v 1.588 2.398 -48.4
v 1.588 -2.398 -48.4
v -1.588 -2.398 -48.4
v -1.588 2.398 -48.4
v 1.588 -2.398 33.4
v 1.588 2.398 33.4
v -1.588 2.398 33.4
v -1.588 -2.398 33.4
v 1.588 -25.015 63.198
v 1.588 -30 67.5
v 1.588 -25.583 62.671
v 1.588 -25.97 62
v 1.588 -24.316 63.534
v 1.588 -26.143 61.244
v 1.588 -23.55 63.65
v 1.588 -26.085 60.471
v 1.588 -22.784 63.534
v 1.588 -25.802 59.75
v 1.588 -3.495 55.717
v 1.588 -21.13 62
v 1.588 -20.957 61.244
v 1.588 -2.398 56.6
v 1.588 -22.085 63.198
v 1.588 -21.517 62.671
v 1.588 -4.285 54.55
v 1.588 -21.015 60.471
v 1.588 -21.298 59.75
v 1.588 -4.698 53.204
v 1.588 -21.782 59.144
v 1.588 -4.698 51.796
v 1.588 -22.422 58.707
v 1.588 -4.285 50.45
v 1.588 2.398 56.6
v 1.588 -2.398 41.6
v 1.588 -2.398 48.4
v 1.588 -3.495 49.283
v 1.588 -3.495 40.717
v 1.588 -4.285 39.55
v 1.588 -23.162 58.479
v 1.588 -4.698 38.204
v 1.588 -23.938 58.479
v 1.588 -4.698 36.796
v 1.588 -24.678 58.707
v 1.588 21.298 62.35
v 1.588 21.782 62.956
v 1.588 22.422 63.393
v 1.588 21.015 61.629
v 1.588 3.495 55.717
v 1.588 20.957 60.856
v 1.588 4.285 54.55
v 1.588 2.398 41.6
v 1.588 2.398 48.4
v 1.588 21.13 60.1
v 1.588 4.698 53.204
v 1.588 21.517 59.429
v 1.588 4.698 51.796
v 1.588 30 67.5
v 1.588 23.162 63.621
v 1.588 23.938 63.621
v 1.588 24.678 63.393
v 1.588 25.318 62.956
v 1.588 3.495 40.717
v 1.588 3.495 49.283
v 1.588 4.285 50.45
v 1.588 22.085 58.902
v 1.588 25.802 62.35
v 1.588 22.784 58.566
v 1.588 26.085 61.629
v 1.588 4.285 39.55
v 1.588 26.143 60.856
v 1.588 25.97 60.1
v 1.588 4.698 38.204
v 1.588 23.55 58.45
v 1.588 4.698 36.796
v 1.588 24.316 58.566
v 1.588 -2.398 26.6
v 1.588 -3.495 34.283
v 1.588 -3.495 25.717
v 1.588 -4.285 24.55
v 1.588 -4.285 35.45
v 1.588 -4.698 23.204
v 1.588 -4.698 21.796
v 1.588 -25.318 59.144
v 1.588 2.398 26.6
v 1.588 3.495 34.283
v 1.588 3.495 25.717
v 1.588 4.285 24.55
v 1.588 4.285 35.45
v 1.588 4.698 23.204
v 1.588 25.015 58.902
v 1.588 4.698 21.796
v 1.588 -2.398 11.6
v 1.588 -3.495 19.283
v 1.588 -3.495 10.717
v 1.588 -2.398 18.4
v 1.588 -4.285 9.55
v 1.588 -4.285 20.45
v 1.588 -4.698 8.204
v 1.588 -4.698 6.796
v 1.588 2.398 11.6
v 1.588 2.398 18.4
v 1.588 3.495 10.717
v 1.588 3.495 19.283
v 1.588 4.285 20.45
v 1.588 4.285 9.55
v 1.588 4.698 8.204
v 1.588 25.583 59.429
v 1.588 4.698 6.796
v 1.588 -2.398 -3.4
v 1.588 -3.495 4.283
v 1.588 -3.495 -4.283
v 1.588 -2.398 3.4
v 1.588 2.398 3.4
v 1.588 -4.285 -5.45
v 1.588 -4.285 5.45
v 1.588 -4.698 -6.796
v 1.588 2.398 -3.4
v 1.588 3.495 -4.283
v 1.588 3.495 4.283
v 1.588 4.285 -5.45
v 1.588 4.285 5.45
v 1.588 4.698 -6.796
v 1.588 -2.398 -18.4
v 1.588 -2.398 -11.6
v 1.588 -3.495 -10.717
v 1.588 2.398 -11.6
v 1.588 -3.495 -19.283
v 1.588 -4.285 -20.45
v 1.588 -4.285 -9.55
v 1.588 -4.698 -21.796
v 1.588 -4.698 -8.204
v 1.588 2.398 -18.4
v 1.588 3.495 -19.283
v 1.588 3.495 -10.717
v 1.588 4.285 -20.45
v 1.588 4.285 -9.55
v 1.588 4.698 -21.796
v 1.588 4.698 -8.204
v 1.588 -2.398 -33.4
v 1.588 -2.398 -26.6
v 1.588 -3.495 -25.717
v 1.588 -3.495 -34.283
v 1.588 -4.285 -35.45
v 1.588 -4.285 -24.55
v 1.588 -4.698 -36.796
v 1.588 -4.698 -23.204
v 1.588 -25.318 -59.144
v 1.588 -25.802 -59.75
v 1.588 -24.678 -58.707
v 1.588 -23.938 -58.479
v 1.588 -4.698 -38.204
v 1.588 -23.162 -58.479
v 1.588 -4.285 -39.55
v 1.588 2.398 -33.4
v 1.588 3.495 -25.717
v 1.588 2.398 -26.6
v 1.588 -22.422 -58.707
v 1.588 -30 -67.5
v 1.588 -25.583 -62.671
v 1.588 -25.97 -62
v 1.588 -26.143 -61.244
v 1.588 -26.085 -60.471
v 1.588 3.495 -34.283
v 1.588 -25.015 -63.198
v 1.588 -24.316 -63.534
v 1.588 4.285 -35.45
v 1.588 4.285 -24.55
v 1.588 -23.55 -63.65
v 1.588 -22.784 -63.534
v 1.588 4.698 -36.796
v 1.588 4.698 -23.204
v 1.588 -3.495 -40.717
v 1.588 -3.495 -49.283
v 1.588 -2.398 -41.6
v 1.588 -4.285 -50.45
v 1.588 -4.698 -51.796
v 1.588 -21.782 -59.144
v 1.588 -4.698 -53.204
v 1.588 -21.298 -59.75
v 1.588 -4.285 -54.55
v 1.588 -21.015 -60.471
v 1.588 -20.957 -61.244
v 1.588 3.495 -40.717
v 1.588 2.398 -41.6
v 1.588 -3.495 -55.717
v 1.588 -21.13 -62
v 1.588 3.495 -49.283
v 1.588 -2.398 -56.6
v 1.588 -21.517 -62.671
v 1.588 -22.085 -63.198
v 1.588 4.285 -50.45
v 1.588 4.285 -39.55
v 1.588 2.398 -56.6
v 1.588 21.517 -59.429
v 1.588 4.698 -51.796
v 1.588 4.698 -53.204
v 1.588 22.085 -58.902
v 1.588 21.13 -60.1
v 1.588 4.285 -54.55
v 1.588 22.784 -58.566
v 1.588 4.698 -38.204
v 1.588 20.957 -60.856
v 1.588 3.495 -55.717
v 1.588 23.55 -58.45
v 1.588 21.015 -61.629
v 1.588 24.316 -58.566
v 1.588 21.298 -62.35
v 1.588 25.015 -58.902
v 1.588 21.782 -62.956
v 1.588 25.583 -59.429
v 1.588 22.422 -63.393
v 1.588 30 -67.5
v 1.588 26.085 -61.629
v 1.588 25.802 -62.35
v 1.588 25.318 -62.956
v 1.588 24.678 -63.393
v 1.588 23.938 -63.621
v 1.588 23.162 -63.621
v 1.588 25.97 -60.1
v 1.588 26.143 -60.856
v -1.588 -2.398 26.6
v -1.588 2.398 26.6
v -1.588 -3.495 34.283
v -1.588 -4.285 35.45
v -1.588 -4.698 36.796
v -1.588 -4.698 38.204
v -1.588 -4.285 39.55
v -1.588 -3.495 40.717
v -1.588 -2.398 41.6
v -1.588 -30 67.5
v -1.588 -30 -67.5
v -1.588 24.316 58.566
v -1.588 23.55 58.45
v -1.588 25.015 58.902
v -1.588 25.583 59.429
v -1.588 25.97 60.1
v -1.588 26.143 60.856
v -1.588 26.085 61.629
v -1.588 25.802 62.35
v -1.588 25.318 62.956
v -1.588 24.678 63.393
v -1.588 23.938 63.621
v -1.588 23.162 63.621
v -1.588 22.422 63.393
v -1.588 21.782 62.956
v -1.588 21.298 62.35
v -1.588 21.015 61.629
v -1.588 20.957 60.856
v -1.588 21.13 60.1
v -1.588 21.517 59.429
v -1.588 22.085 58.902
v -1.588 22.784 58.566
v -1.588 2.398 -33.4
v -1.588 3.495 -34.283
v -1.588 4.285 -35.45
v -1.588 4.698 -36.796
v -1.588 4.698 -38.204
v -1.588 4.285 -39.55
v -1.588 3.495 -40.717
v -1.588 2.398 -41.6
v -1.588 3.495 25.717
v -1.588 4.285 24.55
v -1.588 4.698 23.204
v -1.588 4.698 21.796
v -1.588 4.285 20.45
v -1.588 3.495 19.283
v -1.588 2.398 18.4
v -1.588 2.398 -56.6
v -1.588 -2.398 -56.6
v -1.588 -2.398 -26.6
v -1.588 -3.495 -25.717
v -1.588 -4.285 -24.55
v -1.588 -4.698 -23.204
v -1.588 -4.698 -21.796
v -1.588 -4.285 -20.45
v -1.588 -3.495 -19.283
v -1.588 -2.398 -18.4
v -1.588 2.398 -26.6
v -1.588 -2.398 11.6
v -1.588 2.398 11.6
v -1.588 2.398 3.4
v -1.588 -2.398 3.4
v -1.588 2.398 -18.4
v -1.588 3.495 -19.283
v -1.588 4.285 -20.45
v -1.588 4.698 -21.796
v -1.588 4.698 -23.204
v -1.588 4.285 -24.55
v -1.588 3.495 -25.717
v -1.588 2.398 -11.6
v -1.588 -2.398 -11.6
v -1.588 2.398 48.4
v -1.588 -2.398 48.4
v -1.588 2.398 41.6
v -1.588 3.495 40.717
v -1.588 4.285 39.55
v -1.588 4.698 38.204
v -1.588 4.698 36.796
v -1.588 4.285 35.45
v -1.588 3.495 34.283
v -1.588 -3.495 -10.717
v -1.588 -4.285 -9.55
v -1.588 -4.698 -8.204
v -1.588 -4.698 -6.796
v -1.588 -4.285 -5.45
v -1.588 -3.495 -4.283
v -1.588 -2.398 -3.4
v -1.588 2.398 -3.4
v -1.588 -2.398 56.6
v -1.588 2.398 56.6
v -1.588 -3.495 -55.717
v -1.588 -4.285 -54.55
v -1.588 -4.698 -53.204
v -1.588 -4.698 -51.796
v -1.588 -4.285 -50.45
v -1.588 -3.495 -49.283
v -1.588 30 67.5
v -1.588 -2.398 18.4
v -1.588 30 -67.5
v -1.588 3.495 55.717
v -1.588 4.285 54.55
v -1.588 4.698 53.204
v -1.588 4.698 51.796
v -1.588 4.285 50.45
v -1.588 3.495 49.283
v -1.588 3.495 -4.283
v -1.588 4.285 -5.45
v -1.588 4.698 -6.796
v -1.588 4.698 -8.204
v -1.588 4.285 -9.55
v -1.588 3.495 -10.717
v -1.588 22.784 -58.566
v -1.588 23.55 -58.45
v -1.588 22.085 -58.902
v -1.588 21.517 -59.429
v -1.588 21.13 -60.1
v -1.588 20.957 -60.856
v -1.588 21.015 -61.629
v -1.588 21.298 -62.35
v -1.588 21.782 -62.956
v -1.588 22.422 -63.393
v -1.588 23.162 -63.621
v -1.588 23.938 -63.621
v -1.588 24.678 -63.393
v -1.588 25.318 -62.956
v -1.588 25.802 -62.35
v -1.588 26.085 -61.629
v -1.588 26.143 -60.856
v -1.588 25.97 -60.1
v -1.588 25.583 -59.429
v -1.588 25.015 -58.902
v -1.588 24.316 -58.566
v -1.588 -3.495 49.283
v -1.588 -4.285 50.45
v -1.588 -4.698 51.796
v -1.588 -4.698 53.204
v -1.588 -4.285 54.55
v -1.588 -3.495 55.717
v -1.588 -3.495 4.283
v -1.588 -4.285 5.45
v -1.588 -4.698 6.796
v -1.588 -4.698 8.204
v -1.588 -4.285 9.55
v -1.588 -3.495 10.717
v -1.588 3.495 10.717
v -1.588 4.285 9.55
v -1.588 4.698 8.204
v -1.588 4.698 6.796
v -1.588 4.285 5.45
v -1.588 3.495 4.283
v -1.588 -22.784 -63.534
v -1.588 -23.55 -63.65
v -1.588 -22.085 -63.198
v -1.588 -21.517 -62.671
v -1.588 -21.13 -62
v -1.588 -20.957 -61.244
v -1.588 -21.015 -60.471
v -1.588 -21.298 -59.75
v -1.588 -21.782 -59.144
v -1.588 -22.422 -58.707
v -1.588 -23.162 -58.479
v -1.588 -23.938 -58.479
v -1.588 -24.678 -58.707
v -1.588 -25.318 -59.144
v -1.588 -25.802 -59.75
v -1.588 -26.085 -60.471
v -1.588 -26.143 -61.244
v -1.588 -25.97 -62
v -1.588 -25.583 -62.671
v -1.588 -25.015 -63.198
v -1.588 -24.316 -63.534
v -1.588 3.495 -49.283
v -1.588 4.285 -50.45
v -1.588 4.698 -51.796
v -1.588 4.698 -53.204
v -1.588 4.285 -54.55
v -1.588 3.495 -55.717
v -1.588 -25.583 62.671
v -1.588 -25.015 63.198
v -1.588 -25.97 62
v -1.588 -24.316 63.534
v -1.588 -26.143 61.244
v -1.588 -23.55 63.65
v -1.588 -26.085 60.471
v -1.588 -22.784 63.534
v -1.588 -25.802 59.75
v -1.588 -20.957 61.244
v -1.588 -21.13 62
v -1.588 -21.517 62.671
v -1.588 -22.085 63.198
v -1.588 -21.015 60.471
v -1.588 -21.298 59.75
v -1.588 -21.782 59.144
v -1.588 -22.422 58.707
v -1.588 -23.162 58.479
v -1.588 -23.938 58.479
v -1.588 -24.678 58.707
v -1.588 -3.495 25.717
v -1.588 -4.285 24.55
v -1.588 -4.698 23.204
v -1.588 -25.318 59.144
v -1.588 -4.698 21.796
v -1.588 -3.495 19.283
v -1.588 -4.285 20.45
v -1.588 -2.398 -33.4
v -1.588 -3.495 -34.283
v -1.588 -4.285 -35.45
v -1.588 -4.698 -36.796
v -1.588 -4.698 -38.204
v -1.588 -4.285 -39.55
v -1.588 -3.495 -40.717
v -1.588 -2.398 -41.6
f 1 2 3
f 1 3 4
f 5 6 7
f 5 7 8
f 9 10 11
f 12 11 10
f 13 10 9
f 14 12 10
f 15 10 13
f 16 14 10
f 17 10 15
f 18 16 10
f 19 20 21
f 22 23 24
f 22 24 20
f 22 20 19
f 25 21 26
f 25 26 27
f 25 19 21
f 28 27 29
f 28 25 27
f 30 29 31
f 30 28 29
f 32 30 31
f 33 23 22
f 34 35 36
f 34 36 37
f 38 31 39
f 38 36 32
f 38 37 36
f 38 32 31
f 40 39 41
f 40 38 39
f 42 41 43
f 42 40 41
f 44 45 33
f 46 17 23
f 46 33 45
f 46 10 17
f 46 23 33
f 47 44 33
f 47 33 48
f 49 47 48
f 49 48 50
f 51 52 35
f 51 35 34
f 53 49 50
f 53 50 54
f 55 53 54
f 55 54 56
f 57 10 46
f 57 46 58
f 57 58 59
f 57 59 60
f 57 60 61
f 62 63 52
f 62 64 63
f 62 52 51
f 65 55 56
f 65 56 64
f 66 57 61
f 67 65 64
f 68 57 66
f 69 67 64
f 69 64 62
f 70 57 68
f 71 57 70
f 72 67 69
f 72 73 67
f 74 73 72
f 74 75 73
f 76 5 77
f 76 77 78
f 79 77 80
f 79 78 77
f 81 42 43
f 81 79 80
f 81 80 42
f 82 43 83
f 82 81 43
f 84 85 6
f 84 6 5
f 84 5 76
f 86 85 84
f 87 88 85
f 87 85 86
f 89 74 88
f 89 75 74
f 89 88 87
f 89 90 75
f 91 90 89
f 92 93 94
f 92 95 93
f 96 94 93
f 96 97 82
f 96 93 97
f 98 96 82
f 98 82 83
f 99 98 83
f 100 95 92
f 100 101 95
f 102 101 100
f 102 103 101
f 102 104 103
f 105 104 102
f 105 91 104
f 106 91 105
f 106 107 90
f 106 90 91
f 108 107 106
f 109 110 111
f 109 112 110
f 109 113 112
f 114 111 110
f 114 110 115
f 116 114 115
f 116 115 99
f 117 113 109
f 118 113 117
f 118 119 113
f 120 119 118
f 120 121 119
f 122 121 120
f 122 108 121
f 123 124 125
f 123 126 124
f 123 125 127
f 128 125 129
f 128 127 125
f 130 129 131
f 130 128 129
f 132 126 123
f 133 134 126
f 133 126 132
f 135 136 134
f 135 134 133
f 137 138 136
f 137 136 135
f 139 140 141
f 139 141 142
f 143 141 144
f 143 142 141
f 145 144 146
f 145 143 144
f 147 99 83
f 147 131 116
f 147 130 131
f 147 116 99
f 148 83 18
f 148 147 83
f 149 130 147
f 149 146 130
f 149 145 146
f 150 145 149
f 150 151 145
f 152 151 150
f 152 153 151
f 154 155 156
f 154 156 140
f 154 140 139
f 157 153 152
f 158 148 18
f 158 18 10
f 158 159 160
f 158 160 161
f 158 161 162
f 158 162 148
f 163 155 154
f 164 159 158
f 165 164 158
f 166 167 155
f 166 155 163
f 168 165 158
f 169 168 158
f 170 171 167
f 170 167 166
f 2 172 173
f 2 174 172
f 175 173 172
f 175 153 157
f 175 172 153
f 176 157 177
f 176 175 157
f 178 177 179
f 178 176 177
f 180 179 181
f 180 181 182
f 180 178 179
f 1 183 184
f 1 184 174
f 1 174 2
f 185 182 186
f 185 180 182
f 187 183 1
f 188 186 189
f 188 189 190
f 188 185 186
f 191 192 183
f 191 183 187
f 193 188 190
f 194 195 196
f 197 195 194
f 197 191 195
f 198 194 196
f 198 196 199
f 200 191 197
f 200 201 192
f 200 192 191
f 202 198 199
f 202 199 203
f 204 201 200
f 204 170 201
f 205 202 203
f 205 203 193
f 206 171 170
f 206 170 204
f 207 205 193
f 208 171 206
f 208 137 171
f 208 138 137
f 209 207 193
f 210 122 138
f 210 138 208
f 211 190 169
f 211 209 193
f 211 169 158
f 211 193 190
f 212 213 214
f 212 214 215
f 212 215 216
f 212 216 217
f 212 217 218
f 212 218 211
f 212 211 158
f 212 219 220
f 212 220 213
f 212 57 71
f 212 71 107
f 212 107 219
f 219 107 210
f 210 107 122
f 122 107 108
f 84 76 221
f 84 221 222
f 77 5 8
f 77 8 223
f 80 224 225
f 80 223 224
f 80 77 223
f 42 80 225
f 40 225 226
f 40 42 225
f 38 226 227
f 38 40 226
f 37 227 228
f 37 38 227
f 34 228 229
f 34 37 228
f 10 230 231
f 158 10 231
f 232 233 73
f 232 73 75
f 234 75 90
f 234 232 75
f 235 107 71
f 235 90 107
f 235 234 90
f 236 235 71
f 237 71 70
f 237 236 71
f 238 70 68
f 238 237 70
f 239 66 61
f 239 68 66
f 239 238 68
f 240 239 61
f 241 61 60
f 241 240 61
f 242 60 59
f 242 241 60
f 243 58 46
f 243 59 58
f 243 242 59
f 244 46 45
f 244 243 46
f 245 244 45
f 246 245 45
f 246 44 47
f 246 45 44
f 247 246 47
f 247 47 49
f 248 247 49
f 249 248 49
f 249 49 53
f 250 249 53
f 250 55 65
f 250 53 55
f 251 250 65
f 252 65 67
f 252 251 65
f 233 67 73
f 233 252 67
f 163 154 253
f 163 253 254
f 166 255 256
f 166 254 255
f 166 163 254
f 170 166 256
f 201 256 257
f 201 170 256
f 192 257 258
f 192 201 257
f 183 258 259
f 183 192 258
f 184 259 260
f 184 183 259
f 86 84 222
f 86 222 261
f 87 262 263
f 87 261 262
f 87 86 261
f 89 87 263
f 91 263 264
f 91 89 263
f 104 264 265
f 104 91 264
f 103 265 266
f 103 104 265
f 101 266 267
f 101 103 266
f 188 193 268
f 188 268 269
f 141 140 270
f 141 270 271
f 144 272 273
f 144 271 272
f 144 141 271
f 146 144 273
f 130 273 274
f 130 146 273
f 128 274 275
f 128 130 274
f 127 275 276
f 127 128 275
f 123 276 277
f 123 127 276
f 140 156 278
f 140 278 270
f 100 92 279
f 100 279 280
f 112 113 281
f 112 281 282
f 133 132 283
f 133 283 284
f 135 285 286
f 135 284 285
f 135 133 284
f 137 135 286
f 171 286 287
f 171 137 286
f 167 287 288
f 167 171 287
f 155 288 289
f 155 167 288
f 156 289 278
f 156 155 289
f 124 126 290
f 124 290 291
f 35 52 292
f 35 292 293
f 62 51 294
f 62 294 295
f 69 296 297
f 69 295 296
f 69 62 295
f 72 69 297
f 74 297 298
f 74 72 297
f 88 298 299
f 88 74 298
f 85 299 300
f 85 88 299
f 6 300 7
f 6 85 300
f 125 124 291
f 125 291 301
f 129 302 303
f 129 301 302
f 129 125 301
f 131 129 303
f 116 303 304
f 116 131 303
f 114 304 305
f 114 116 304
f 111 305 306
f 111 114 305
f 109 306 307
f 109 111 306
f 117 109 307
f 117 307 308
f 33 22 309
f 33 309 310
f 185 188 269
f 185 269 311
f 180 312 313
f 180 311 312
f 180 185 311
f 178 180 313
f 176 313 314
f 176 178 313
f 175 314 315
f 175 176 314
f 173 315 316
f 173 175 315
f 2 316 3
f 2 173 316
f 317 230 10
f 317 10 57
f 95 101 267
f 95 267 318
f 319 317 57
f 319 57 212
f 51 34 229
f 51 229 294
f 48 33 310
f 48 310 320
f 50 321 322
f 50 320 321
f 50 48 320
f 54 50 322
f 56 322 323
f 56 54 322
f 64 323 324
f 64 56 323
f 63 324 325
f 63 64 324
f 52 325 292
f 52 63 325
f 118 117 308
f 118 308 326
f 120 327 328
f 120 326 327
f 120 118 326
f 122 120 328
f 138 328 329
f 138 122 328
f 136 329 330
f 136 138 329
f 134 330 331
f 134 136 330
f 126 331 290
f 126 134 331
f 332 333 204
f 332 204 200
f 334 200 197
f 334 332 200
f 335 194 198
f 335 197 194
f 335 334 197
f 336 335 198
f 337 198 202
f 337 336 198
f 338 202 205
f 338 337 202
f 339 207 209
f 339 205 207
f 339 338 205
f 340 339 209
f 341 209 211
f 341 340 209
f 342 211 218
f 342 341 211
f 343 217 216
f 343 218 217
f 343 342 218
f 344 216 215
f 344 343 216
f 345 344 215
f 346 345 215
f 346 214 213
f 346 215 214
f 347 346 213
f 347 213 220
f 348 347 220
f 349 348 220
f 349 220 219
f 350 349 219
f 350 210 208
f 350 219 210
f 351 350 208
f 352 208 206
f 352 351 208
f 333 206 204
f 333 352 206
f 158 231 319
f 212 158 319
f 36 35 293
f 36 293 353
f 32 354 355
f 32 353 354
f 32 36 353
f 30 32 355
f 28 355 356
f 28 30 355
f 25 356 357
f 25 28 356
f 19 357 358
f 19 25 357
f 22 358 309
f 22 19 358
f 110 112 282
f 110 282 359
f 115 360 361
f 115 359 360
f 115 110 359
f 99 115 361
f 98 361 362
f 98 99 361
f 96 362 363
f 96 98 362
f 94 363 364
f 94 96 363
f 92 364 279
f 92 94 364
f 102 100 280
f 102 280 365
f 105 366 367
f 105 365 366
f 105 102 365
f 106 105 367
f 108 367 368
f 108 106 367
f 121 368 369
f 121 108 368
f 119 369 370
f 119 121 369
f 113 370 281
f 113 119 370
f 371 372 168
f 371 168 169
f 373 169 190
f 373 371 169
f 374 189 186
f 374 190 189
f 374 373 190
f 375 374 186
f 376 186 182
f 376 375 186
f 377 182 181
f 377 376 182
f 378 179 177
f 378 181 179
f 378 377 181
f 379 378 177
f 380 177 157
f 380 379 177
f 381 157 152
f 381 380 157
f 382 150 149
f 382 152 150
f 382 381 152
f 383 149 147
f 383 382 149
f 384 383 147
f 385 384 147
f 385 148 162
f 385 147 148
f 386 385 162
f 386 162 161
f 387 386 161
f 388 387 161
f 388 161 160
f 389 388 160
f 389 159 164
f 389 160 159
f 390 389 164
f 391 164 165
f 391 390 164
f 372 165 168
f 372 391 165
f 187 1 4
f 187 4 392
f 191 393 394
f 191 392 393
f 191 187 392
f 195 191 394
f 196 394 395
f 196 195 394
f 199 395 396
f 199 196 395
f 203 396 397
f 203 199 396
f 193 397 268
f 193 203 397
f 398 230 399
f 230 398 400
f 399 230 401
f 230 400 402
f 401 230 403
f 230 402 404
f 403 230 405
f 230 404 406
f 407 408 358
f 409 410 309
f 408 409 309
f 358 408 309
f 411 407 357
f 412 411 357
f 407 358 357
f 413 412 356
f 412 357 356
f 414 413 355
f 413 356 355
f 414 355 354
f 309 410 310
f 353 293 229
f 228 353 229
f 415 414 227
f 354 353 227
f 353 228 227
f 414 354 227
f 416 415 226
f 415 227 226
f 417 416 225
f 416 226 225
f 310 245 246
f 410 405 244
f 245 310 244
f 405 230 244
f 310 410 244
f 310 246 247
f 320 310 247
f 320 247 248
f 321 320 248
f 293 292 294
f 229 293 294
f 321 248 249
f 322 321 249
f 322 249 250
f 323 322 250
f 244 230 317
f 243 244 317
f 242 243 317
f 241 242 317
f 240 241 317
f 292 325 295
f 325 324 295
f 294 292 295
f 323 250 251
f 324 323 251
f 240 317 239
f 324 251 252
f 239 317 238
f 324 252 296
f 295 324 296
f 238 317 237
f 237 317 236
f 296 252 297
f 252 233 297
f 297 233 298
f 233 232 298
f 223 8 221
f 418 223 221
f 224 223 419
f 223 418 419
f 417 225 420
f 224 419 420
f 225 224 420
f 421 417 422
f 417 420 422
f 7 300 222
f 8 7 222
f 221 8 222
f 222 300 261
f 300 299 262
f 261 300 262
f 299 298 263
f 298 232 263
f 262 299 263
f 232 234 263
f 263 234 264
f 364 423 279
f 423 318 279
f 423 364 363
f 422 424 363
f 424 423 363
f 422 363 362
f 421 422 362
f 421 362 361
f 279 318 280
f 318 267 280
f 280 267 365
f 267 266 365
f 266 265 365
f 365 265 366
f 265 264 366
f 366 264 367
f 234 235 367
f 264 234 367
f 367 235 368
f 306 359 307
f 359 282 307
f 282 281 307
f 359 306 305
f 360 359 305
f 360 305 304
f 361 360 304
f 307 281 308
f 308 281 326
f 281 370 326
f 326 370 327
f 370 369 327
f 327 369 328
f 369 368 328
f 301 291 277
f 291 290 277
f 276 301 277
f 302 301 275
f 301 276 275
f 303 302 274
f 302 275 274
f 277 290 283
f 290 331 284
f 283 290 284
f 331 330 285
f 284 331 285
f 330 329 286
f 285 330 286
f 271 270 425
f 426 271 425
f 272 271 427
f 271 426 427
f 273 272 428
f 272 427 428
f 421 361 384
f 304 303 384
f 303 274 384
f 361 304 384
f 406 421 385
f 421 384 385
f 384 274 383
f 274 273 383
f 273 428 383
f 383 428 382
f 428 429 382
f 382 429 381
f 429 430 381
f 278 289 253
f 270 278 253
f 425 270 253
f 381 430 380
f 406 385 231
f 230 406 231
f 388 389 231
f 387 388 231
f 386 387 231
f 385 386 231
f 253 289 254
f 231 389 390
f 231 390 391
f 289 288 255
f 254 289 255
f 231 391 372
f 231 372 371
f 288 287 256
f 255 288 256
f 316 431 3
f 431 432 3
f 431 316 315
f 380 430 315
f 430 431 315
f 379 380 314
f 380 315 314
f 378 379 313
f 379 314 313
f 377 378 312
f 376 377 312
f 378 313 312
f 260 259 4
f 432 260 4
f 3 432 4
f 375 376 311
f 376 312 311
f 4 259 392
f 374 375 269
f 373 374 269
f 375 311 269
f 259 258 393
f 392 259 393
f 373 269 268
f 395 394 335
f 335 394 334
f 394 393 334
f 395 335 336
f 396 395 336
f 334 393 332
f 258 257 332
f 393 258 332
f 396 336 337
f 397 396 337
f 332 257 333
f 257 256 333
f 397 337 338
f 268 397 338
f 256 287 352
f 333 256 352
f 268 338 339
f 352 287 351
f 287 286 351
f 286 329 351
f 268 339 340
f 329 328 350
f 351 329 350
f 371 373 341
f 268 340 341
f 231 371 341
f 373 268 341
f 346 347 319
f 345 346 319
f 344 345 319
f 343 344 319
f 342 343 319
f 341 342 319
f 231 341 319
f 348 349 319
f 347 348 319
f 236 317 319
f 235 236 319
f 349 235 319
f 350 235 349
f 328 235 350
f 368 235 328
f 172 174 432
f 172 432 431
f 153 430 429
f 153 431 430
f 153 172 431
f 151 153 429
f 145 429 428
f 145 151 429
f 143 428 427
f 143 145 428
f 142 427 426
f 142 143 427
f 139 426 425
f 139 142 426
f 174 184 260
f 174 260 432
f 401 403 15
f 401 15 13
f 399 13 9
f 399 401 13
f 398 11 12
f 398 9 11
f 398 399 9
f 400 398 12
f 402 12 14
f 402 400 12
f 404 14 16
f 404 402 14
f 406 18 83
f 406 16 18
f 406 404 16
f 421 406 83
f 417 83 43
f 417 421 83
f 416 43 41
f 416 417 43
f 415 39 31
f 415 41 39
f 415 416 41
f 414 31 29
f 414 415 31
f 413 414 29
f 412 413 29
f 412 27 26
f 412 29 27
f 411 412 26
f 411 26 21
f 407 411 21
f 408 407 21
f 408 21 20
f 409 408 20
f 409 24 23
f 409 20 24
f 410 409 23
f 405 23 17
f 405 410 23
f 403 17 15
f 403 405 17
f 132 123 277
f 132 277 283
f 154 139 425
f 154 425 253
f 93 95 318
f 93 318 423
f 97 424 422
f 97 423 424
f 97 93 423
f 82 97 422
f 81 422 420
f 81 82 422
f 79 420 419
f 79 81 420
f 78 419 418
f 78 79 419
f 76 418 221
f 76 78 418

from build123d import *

# Parameters (mm, degrees)
BOSS_EXTRUDE1_DEPTH      = 1.5875
BOSS_EXTRUDE1_DEPTH_BACK = 1.5875
SKETCH1_W                = 135
SKETCH1_H                = 60
CUT_EXTRUDE1_DEPTH       = 74.883490417
CUT_EXTRUDE1_DEPTH_BACK  = 74.883490417
SKETCH2_R                = 2.6
CUT_EXTRUDE2_DEPTH       = 74.883490417
LPATTERN1_COUNT          = 8
LPATTERN1_PITCH          = 15


with BuildPart() as part:
    # Sketch1 → Boss-Extrude1 (new, two sides: drawn at the far end of the back side and taken through both)
    with BuildSketch(Plane(origin=(0, 0, 0), x_dir=(0, 0, -1), z_dir=(1, 0, 0)).offset(-BOSS_EXTRUDE1_DEPTH_BACK)):
        Rectangle(SKETCH1_W, SKETCH1_H)
    extrude(amount=BOSS_EXTRUDE1_DEPTH + BOSS_EXTRUDE1_DEPTH_BACK)

    # Sketch2 → Cut-Extrude1 (cut, two sides: drawn at the far end of the back side and taken through both)
    with BuildSketch(Plane(origin=(0, 0, 0), x_dir=(0, 0, -1), z_dir=(1, 0, 0)).offset(-CUT_EXTRUDE1_DEPTH_BACK)):
        with Locations((-61.05, 23.55)):
            Circle(SKETCH2_R)
        with Locations((61.05, 23.55)):
            Circle(SKETCH2_R)
        with Locations((61.05, -23.55)):
            Circle(SKETCH2_R)
        with Locations((-61.05, -23.55)):
            Circle(SKETCH2_R)
    extrude(amount=CUT_EXTRUDE1_DEPTH + CUT_EXTRUDE1_DEPTH_BACK, mode=Mode.SUBTRACT)

    # Sketch3 → Cut-Extrude2 (cut, symmetric)
    with BuildSketch(Plane(origin=(0, 0, 0), x_dir=(0, 0, -1), z_dir=(1, 0, 0))):
        with BuildLine():
            Line((-56.6, -2.398436991), (-56.6, 2.398436991))
            ThreePointArc((-56.6, 2.398436991), (-52.5, 4.75), (-48.4, 2.398436991))
            Line((-48.4, 2.398436991), (-48.4, -2.398436991))
            ThreePointArc((-48.4, -2.398436991), (-52.5, -4.75), (-56.6, -2.398436991))
        make_face()
    cut_extrude2 = extrude(amount=CUT_EXTRUDE2_DEPTH, both=True, mode=Mode.SUBTRACT)

    # LPattern1: Cut-Extrude2 ×8
    with Locations(*[(0, 0, -i * LPATTERN1_PITCH) for i in range(1, LPATTERN1_COUNT)]):
        add(cut_extrude2, mode=Mode.SUBTRACT)


solid = part.part
